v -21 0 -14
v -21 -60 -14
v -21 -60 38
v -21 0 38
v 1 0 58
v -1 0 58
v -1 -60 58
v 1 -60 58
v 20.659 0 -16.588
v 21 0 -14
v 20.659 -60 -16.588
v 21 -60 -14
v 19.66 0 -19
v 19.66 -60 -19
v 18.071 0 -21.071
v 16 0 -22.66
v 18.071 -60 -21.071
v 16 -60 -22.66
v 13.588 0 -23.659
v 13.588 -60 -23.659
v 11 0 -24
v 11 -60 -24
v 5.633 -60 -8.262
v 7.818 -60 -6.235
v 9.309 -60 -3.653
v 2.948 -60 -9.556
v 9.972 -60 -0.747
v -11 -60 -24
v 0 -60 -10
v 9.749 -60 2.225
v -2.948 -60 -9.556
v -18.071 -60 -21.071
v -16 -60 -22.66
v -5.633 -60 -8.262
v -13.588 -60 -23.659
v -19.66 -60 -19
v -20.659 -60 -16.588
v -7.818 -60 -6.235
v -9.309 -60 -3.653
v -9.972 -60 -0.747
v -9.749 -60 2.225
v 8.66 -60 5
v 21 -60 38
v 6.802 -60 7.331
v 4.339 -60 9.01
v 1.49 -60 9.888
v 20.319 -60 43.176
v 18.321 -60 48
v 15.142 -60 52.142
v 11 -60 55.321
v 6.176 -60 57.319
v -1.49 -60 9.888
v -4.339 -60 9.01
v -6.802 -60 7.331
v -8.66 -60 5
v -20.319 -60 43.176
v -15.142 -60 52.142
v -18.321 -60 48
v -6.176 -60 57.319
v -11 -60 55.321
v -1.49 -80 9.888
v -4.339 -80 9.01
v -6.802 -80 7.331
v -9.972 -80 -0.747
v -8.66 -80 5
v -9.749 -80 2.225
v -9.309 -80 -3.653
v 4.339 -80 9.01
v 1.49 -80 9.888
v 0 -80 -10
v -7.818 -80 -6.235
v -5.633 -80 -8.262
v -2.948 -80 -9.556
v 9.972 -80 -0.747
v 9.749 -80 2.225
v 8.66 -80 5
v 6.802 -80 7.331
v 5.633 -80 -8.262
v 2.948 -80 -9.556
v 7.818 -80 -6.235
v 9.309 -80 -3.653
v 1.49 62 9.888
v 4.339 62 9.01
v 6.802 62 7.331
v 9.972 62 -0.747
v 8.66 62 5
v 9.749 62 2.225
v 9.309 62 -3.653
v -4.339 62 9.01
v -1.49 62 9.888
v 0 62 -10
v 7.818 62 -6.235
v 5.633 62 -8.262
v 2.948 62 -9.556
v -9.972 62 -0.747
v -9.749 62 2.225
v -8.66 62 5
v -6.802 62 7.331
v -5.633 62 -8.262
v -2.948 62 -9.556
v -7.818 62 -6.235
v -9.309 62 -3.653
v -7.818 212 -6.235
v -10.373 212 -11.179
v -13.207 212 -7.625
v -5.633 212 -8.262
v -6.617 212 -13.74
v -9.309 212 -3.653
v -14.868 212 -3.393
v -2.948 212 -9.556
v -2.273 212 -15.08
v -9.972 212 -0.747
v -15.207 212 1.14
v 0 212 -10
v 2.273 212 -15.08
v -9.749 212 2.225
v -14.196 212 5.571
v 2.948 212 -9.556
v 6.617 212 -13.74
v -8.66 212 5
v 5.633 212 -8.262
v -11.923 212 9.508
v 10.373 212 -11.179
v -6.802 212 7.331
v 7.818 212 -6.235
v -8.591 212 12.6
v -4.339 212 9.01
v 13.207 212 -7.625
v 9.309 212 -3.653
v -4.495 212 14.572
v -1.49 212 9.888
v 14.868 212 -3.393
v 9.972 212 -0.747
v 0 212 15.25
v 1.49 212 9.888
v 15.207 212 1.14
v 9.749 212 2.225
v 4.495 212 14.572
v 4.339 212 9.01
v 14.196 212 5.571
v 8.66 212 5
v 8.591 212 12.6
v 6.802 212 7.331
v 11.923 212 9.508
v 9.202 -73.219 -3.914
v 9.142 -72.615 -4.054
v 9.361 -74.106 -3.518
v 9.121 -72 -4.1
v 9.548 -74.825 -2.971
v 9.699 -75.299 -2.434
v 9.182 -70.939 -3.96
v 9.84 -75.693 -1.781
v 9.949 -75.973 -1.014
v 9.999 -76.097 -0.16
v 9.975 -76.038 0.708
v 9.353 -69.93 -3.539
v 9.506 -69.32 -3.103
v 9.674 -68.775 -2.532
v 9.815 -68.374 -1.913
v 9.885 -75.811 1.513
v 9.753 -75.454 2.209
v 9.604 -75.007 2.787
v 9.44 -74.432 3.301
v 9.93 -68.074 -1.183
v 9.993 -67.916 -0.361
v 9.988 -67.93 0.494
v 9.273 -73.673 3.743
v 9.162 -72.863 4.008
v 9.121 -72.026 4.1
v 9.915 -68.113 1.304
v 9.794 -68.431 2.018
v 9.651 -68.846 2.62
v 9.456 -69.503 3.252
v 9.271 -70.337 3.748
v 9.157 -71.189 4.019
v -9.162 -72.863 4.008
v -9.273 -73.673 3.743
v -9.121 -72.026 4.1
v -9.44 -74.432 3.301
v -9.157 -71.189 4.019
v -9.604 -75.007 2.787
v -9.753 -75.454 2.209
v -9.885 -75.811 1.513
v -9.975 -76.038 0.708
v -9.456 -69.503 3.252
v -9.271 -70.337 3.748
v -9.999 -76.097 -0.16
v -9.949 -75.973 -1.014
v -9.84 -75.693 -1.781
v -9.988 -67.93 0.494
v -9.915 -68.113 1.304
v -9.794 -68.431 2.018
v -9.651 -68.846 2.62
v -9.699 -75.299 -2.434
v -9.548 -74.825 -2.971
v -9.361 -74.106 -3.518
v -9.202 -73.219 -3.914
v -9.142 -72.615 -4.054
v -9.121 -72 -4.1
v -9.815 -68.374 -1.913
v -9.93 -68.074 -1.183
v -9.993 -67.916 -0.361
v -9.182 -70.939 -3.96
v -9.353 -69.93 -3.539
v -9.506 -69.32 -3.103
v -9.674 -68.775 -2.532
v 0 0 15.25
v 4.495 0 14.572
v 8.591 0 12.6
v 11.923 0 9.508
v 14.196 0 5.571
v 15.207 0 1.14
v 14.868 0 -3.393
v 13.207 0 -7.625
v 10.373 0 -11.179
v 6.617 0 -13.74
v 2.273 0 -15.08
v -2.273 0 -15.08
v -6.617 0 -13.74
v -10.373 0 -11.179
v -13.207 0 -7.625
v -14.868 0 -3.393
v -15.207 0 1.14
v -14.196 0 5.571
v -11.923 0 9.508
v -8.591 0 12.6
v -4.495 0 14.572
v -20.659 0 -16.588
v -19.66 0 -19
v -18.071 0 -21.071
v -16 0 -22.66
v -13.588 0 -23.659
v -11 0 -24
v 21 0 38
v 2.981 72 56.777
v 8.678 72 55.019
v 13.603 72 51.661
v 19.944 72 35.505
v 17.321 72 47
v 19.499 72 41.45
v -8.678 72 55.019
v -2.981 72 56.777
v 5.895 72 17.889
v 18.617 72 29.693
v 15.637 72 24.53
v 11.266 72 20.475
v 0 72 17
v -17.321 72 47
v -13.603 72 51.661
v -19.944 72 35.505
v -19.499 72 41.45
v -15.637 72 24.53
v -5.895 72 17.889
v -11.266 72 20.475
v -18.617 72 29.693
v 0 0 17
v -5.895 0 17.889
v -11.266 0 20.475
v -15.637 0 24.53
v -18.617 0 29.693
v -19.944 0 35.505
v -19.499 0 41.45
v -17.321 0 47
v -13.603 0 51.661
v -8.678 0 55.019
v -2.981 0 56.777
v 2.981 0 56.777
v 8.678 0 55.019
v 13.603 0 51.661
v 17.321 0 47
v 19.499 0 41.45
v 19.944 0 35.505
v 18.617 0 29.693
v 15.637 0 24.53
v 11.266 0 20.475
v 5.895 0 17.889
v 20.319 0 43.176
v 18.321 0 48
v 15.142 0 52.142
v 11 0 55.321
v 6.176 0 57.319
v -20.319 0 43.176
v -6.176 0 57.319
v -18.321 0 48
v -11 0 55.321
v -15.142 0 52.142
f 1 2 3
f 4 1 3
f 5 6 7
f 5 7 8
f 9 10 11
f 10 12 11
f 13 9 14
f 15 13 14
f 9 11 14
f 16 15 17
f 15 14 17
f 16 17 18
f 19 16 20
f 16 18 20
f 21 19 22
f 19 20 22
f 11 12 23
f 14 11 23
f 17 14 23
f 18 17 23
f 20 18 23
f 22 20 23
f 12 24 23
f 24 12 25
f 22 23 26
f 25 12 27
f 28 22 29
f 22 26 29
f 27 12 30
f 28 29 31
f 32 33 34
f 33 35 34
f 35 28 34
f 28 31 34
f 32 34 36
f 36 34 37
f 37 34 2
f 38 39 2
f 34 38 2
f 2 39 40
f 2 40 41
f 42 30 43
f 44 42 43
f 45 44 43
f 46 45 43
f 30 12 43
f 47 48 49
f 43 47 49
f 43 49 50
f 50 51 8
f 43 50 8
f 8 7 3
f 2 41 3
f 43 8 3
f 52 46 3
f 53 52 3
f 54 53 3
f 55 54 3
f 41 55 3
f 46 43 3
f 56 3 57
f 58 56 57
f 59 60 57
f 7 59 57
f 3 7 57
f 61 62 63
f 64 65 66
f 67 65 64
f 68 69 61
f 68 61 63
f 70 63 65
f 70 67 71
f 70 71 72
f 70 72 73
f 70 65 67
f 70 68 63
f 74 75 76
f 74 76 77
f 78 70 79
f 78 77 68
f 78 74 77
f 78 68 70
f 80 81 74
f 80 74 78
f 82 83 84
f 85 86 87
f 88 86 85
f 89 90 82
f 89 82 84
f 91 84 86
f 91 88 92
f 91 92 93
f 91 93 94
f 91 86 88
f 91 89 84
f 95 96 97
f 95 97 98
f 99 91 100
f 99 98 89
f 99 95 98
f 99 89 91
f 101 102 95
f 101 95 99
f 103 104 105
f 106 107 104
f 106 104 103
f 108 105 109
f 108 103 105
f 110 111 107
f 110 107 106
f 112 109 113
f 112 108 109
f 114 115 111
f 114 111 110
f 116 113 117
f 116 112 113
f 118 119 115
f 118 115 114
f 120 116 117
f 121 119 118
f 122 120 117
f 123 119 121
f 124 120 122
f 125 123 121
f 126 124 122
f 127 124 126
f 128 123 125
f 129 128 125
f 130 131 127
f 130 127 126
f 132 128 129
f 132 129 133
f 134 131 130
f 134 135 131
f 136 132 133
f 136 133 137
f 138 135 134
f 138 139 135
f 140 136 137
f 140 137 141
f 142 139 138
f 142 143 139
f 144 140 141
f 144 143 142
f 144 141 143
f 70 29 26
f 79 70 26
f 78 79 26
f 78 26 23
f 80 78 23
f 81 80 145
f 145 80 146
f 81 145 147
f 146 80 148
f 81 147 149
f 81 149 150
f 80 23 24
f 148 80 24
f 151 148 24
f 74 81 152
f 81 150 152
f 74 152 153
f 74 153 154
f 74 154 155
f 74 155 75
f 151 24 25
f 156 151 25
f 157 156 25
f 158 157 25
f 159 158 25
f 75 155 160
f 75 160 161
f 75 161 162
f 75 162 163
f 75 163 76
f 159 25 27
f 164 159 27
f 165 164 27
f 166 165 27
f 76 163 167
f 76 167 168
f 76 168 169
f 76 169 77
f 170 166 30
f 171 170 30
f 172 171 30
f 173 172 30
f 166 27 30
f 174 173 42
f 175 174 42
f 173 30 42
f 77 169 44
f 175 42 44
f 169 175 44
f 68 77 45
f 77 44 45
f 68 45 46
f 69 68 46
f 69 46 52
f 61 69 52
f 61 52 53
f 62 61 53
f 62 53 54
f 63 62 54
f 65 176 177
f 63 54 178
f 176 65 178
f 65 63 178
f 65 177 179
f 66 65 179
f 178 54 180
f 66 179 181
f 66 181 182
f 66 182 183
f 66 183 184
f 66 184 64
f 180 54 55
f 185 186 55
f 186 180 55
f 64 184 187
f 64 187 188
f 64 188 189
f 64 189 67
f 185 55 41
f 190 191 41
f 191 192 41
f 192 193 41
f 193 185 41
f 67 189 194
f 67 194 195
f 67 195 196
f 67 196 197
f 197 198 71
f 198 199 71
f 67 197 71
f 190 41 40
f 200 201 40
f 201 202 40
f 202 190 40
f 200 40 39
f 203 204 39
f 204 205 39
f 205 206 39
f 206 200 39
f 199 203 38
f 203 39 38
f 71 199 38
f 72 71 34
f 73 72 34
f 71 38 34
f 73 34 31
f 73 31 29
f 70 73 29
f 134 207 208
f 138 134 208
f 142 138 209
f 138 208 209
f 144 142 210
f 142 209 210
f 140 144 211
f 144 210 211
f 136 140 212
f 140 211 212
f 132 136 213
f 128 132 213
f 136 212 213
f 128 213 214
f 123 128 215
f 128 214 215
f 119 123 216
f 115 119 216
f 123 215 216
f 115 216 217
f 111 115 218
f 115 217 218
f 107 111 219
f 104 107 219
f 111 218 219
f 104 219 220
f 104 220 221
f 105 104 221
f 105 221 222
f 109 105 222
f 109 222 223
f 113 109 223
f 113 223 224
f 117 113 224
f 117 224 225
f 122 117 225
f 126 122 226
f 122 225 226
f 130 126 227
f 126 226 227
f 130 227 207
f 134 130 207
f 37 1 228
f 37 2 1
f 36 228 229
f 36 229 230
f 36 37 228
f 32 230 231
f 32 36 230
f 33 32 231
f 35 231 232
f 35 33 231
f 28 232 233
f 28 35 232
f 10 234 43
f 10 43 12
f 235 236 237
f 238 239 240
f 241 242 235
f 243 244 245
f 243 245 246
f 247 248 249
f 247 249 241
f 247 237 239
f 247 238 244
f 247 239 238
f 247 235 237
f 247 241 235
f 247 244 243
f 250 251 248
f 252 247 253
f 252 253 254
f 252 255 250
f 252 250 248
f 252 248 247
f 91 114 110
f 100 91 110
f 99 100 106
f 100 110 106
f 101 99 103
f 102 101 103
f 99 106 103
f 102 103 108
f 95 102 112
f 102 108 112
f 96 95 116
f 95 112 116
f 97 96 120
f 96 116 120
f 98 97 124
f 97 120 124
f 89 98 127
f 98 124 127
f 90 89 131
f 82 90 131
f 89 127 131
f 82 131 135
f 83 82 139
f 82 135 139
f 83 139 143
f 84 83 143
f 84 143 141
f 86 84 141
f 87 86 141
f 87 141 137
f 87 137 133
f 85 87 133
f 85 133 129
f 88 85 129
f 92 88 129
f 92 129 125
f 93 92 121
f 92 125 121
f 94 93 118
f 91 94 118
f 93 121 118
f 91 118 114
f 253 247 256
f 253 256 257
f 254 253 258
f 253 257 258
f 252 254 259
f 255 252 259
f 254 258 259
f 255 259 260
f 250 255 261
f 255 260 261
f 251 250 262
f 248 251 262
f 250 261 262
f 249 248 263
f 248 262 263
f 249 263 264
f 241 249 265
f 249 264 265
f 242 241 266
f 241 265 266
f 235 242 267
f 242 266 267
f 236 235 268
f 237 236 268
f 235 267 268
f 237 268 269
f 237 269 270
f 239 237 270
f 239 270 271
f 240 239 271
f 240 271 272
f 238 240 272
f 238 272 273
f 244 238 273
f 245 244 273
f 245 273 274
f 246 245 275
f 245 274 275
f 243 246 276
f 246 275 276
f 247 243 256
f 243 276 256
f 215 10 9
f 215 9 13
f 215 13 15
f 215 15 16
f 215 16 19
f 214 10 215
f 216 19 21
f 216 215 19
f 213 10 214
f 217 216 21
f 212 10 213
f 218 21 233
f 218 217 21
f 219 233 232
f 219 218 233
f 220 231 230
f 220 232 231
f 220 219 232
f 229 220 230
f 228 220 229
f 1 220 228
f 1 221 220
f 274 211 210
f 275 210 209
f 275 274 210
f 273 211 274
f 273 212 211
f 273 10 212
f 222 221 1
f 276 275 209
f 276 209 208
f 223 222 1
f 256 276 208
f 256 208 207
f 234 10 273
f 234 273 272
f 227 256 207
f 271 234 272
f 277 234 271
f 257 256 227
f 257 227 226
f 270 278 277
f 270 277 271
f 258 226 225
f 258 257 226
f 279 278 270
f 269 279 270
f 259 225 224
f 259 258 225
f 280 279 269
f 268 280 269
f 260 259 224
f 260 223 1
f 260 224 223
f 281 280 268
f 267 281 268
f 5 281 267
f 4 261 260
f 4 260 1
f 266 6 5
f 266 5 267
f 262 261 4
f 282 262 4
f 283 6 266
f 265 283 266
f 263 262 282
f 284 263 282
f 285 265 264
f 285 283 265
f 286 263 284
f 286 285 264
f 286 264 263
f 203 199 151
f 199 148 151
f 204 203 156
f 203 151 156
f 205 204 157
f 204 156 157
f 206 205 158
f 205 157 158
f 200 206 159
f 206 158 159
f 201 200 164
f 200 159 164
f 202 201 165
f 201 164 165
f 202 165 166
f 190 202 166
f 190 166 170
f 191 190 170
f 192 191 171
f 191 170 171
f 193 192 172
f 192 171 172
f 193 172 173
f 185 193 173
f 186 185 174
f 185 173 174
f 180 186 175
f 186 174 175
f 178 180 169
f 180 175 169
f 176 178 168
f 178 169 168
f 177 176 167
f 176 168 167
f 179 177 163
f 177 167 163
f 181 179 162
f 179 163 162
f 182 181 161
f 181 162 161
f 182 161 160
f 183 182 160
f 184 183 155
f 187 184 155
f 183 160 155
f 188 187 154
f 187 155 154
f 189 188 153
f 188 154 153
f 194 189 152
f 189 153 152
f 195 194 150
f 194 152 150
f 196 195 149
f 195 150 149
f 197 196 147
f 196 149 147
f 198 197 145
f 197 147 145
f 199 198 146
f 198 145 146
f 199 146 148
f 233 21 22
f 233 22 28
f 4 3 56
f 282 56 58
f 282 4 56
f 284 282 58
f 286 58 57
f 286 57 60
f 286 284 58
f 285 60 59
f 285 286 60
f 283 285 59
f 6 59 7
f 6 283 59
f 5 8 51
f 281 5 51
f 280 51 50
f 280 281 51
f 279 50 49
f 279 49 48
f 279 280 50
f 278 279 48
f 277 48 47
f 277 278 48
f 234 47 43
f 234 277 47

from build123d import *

# Parameters (mm, degrees)
SKETCH1_R      = 15.25
EXTRUDE1_DEPTH = 212
EXTRUDE2_DEPTH = 60
SKETCH3_R      = 20
EXTRUDE3_DEPTH = 72
SKETCH4_R      = 10
EXTRUDE4_DEPTH = 20
SKETCH5_R      = 4.1
EXTRUDE5_DEPTH = 15
SKETCH6_R      = 10
EXTRUDE6_DEPTH = 150
FILLET_1_R     = 10


with BuildPart() as part:
    # Sketch1 → Extrude1 (new body)
    with BuildSketch(Plane(origin=(0, 0, 0), x_dir=(1, 0, 0), z_dir=(0, 1, 0))):
        with Locations(Location((0, 0, 0), (0, 0, 270))):
            Circle(SKETCH1_R)
    extrude(amount=EXTRUDE1_DEPTH)

    # Sketch2 → Extrude2 (add)
    with BuildSketch(Plane.XZ):
        with BuildLine():
            Line((-1, 58), (1, 58))
            ThreePointArc((1, 58), (15.142135624, 52.142135624), (21, 38))
            Line((21, 38), (21, -24))
            Line((21, -24), (-21, -24))
            Line((-21, -24), (-21, 38))
            ThreePointArc((-21, 38), (-15.142135624, 52.142135624), (-1, 58))
        make_face()
    extrude(amount=EXTRUDE2_DEPTH)

    # Sketch3 → Extrude3 (add)
    with BuildSketch(Plane(origin=(0, 0, 0), x_dir=(1, 0, 0), z_dir=(0, 1, 0))):
        with Locations(Location((0, -37, 0), (0, 0, 90))):
            Circle(SKETCH3_R)
    extrude(amount=EXTRUDE3_DEPTH)

    # Sketch4 → Extrude4 (add)
    with BuildSketch(Plane.XZ.offset(60)):
        with Locations(Location((0, 0, 0), (0, 0, 270))):
            Circle(SKETCH4_R)
    extrude(amount=EXTRUDE4_DEPTH)

    # Sketch5 → Extrude5 (cut, symmetric)
    with BuildSketch(Plane(origin=(0, 0, 0), x_dir=(0, 0, -1), z_dir=(1, 0, 0))):
        with Locations((0, -72)):
            Circle(SKETCH5_R)
    extrude(amount=EXTRUDE5_DEPTH, both=True, mode=Mode.SUBTRACT)

    # Sketch6 → Extrude6 (cut)
    with BuildSketch(Plane(origin=(0, 212, 0), x_dir=(1, 0, 0), z_dir=(0, 1, 0))):
        with Locations(Location((0, 0, 0), (0, 0, 90))):
            Circle(SKETCH6_R)
    extrude(amount=-EXTRUDE6_DEPTH, mode=Mode.SUBTRACT)

    # Скругление1
    fillet_1_edges = [part.edges().sort_by_distance(p)[0] for p in [
        (21, -30, -24),
        (-21, -30, -24),
    ]]
    fillet(fillet_1_edges, radius=FILLET_1_R)


solid = part.part
